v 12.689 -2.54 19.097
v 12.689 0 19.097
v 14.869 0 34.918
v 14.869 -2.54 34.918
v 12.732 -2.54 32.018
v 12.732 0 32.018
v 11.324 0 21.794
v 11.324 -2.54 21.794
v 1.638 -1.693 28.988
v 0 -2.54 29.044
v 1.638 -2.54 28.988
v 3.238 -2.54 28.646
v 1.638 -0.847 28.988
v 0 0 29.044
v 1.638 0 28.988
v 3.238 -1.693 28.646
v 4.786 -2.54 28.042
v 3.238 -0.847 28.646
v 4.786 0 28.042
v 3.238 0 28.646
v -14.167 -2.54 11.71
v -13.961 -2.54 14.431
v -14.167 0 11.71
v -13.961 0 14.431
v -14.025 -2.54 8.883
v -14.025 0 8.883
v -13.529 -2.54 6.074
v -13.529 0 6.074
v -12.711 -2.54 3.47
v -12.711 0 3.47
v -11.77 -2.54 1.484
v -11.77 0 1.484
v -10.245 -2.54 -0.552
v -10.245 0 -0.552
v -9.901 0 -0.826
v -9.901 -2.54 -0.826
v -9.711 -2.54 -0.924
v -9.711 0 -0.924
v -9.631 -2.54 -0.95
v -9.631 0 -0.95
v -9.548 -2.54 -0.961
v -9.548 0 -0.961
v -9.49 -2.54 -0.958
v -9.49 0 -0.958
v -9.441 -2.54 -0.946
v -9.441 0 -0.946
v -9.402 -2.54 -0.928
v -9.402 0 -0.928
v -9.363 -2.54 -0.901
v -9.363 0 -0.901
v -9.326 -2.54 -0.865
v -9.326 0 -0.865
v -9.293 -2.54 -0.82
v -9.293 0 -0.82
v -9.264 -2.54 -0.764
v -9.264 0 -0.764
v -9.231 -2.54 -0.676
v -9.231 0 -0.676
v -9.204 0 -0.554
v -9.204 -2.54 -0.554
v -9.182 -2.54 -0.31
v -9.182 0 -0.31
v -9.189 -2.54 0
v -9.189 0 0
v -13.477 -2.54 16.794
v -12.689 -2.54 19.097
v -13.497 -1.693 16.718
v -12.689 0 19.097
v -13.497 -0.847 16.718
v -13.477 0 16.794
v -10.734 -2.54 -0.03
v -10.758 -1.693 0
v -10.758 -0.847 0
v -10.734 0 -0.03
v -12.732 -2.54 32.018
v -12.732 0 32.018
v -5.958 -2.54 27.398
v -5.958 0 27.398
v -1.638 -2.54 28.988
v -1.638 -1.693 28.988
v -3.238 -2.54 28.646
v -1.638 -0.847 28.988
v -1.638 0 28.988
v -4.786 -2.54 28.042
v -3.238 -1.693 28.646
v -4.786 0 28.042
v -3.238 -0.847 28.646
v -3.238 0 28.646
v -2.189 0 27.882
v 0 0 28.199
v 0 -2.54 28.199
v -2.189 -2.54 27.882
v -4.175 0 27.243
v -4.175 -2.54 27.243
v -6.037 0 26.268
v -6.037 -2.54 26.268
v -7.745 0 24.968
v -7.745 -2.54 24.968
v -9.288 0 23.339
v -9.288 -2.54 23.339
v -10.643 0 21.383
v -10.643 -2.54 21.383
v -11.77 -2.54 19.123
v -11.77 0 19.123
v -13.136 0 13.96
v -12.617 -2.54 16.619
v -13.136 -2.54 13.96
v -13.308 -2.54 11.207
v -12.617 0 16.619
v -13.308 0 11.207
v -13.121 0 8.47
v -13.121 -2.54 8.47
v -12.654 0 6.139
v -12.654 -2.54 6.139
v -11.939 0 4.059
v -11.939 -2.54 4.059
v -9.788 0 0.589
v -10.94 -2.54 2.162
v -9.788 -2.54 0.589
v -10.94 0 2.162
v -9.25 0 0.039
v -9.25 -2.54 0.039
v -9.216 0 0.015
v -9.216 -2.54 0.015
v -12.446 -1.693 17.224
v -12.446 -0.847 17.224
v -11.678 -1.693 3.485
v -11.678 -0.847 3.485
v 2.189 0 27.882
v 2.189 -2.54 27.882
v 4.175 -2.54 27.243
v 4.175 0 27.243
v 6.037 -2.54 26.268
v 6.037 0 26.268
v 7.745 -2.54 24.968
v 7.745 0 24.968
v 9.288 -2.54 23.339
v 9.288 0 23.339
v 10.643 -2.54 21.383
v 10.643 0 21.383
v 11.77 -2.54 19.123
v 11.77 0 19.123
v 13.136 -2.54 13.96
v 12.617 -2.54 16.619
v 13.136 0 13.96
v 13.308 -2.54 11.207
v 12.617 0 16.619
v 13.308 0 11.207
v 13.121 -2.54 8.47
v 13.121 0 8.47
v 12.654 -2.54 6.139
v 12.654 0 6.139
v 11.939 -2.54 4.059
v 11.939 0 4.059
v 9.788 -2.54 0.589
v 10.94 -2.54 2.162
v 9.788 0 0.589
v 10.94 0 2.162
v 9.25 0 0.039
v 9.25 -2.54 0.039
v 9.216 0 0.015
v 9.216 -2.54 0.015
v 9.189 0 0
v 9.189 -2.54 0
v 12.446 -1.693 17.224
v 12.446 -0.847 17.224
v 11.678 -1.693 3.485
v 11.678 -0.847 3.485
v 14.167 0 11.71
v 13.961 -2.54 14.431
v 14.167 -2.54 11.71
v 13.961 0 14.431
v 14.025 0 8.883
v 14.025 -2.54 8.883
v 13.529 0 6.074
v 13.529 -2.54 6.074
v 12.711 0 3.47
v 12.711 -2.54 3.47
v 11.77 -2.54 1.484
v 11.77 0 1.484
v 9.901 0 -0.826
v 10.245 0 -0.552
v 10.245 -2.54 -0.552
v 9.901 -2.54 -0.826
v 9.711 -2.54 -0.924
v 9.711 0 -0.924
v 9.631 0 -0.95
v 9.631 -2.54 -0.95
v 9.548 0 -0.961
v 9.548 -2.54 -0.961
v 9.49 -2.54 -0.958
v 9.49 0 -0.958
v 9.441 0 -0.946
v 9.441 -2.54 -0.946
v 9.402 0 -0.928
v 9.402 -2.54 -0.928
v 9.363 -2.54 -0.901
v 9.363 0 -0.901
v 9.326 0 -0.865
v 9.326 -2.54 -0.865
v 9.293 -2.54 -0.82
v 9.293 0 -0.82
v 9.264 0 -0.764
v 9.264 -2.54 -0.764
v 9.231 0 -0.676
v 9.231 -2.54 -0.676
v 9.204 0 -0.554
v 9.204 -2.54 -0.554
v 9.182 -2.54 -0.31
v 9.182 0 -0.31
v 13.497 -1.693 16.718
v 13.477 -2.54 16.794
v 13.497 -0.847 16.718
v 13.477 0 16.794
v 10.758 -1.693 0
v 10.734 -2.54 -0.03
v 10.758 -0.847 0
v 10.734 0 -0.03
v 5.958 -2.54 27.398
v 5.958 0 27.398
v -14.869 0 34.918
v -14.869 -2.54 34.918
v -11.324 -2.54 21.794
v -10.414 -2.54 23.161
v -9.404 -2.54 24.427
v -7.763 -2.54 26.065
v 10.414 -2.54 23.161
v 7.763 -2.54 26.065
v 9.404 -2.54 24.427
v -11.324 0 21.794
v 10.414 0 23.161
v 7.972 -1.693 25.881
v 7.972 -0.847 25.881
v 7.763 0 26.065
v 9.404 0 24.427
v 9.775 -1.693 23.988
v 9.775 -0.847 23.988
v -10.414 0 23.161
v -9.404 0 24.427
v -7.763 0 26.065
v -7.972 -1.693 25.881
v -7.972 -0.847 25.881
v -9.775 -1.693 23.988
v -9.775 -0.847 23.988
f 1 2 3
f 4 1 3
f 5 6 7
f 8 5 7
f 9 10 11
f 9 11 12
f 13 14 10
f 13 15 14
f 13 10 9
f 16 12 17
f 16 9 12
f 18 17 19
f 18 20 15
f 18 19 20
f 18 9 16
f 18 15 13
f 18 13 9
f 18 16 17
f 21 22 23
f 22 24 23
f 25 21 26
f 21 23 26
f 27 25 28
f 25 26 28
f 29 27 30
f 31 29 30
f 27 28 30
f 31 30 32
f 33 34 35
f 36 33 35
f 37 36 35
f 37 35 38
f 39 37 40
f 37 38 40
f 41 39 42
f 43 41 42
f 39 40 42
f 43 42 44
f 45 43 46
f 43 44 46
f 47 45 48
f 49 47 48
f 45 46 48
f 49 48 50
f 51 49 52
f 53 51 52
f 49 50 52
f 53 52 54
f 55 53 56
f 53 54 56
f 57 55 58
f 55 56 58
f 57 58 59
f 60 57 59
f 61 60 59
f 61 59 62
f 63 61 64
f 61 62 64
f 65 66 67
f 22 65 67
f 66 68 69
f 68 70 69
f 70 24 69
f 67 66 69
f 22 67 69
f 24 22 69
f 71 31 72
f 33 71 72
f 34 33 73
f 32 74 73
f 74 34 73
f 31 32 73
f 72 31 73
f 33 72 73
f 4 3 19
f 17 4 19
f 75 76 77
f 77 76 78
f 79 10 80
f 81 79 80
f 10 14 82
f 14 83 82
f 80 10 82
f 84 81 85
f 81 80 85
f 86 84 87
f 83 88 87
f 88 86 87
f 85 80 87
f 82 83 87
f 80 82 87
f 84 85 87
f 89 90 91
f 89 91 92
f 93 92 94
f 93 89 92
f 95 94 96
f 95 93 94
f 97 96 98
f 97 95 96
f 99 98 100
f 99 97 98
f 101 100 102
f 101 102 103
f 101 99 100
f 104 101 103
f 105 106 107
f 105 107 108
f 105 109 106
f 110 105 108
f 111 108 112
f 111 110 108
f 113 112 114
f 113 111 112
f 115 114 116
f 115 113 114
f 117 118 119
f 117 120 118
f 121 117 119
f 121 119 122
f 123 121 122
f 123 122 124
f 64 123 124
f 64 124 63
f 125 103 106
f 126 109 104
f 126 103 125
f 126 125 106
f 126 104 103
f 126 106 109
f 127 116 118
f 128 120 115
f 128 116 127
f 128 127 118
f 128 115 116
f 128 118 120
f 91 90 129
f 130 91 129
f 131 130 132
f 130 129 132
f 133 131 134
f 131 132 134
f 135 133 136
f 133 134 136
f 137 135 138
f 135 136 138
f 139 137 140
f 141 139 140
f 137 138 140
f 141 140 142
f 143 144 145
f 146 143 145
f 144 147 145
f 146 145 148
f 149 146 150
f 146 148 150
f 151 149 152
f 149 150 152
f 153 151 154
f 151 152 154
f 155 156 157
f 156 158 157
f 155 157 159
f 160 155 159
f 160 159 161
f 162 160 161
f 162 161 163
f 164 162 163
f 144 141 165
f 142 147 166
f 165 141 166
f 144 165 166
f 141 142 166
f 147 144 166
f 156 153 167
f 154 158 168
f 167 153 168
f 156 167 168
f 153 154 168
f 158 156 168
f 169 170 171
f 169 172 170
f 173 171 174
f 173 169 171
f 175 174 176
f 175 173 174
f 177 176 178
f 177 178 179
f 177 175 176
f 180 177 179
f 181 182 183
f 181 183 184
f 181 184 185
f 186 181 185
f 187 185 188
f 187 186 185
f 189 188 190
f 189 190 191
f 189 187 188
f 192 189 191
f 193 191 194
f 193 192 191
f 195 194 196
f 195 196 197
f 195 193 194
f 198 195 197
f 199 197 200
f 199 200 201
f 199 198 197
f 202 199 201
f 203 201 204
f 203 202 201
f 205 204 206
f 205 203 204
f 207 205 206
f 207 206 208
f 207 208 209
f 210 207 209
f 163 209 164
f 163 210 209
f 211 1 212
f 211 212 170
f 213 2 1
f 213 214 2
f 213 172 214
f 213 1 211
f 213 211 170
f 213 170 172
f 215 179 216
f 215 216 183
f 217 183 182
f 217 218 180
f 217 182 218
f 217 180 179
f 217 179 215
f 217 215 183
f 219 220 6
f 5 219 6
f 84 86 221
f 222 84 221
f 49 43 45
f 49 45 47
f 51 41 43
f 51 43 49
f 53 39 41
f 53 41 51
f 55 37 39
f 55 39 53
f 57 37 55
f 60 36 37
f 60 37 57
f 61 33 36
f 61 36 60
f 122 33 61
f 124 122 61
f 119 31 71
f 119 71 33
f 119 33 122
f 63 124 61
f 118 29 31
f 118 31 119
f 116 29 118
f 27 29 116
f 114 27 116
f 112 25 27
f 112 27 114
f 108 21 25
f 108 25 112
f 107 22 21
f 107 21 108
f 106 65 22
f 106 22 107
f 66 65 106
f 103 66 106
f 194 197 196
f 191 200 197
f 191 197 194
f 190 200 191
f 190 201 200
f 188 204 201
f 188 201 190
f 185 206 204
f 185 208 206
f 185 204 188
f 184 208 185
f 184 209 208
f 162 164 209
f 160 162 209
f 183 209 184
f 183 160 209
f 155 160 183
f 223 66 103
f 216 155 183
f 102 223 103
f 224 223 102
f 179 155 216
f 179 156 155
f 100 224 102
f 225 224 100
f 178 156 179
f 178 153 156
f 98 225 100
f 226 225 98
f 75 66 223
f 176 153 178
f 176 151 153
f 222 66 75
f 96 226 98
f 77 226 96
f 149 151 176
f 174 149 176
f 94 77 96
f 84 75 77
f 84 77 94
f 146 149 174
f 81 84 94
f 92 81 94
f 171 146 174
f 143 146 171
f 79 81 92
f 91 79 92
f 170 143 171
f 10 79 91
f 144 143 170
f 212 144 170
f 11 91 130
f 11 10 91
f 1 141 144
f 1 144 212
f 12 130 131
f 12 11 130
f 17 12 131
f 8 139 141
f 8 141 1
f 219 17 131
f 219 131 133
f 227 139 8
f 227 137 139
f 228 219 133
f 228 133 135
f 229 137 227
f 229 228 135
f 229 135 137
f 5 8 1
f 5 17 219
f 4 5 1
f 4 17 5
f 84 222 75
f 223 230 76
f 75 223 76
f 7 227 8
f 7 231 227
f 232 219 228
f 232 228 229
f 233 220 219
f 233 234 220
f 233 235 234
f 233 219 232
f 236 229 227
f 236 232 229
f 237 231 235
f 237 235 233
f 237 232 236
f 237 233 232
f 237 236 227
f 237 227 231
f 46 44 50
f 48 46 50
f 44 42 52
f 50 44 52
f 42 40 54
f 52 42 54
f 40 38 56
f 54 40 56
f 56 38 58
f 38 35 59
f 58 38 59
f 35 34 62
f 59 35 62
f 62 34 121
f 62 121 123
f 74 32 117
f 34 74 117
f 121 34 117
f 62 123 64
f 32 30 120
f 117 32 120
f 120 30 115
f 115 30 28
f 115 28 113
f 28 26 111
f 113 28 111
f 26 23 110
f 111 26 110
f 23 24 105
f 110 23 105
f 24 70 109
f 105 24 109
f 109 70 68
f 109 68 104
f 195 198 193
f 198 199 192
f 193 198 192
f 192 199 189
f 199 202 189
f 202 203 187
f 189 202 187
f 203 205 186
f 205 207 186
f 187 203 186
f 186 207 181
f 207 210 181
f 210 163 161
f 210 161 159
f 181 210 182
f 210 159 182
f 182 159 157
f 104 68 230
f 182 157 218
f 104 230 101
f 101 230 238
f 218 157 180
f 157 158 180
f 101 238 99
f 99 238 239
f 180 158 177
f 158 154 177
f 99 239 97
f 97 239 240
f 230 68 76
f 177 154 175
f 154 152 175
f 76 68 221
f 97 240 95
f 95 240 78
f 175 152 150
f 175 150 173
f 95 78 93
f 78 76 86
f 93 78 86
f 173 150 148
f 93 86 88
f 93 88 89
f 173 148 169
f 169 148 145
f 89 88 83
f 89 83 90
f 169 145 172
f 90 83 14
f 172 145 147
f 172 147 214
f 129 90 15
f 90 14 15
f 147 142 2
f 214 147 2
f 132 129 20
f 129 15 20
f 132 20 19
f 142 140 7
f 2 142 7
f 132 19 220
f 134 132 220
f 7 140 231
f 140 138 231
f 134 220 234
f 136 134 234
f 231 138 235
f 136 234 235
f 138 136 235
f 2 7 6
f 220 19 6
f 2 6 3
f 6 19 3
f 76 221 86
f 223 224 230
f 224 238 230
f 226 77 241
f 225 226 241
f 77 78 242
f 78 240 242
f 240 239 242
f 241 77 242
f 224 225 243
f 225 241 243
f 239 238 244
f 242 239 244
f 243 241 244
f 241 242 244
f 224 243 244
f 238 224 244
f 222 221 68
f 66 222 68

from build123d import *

# Parameters (mm, degrees)
F1_DEPTH = 2.54


with BuildPart() as f1:
    # F0 (on Front) → F1 (new body)
    with BuildSketch(Plane.XZ):
        with BuildLine():
            Line((14.8689377659, 34.9178511836), (4.7862156734, 28.0418161935))
            add(Edge.make_bspline(
                [(4.7862156734, 28.0418161935), (5.1842631853, 27.8511368087), (5.5753581281, 27.6360125047), (5.9582704652, 27.3984828182)],
                knots=[0.1204484957, 0.1204484957, 0.1204484957, 0.1204484957, 0.1520508561, 0.1520508561, 0.1520508561, 0.1520508561], degree=3))
            Line((5.9582704652, 27.3984828182), (12.732363106, 32.0181577032))
            Line((12.732363106, 32.0181577032), (11.3236512241, 21.7942845656))
            add(Edge.make_bspline(
                [(11.3236512241, 21.7942845656), (11.8440132645, 20.9359181108), (12.302606577, 20.0312328496), (12.6890896057, 19.0973762258)],
                knots=[0.3256392374, 0.3256392374, 0.3256392374, 0.3256392374, 0.3898994489, 0.3898994489, 0.3898994489, 0.3898994489], degree=3))
            Line((12.6890896057, 19.0973762258), (14.8689377659, 34.9178511836))
        make_face()
        with BuildLine():
            add(Edge.make_bspline(
                [(-4.7862156734, 28.0418161935), (-5.1842631853, 27.8511368087), (-5.5753581281, 27.6360125047), (-5.9582704652, 27.3984828182)],
                knots=[0.1204484957, 0.1204484957, 0.1204484957, 0.1204484957, 0.1520508561, 0.1520508561, 0.1520508561, 0.1520508561], degree=3))
            Line((-4.7862156734, 28.0418161935), (-14.8689377659, 34.9178511836))
            Line((-14.8689377659, 34.9178511836), (-12.6890896057, 19.0973762258))
            add(Edge.make_bspline(
                [(-11.3236512241, 21.7942845656), (-11.8440132645, 20.9359181108), (-12.302606577, 20.0312328496), (-12.6890896057, 19.0973762258)],
                knots=[0.3256392374, 0.3256392374, 0.3256392374, 0.3256392374, 0.3898994489, 0.3898994489, 0.3898994489, 0.3898994489], degree=3))
            Line((-11.3236512241, 21.7942845656), (-12.732363106, 32.0181577032))
            Line((-12.732363106, 32.0181577032), (-5.9582704652, 27.3984828182))
        make_face()
        with BuildLine():
            add(Edge.make_bspline(
                [(0, 29.043843347), (1.6510006337, 29.1402167196), (3.2691067187, 28.7685671305), (4.7862156734, 28.0418161935)],
                knots=[0, 0, 0, 0, 0.1204484957, 0.1204484957, 0.1204484957, 0.1204484957], degree=3))
            add(Edge.make_bspline(
                [(0, 29.043843347), (-1.6510006337, 29.1402167196), (-3.2691067187, 28.7685671305), (-4.7862156734, 28.0418161935)],
                knots=[0, 0, 0, 0, 0.1204484957, 0.1204484957, 0.1204484957, 0.1204484957], degree=3))
            add(Edge.make_bspline(
                [(-4.7862156734, 28.0418161935), (-5.1842631853, 27.8511368087), (-5.5753581281, 27.6360125047), (-5.9582704652, 27.3984828182)],
                knots=[0.1204484957, 0.1204484957, 0.1204484957, 0.1204484957, 0.1520508561, 0.1520508561, 0.1520508561, 0.1520508561], degree=3))
            add(Edge.make_bspline(
                [(-5.9582704652, 27.3984828182), (-8.0615669228, 26.0937576898), (-9.9179788464, 24.1130202187), (-11.3236512241, 21.7942845656)],
                knots=[0.1520508561, 0.1520508561, 0.1520508561, 0.1520508561, 0.3256392374, 0.3256392374, 0.3256392374, 0.3256392374], degree=3))
            add(Edge.make_bspline(
                [(-11.3236512241, 21.7942845656), (-11.8440132645, 20.9359181108), (-12.302606577, 20.0312328496), (-12.6890896057, 19.0973762258)],
                knots=[0.3256392374, 0.3256392374, 0.3256392374, 0.3256392374, 0.3898994489, 0.3898994489, 0.3898994489, 0.3898994489], degree=3))
            add(Edge.make_bspline(
                [(-12.6890896057, 19.0973762258), (-13.0103649171, 18.3210806182), (-15.4505220691, 11.1613604921), (-12.8247367975, 1.0065517387), (-9.0871575297, -1.5643117344), (-9.1890276516, 0)],
                knots=[0.3898994489, 0.3898994489, 0.3898994489, 0.3898994489, 0.4433176275, 0.8701021062, 1, 1, 1, 1], degree=3))
            add(Edge.make_bspline(
                [(0, 28.1988892792), (-6.7379450358, 27.7811610109), (-14.5293932549, 18.0290497191), (-13.0806609004, 4.071660879), (-9.4108605954, 0.1006722728), (-9.1890276516, 0)],
                knots=[0, 0, 0, 0, 0.4049172426, 0.7736450245, 0.9793497587, 0.9793497587, 0.9793497587, 0.9793497587], degree=3))
            add(Edge.make_bspline(
                [(0, 28.1988892792), (6.7379450358, 27.7811610109), (14.5293932549, 18.0290497191), (13.0806609004, 4.071660879), (9.4108605954, 0.1006722728), (9.1890276516, 0)],
                knots=[0, 0, 0, 0, 0.4049172426, 0.7736450245, 0.9793497587, 0.9793497587, 0.9793497587, 0.9793497587], degree=3))
            add(Edge.make_bspline(
                [(12.6890896057, 19.0973762258), (13.0103649171, 18.3210806182), (15.4505220691, 11.1613604921), (12.8247367975, 1.0065517387), (9.0871575297, -1.5643117344), (9.1890276516, 0)],
                knots=[0.3898994489, 0.3898994489, 0.3898994489, 0.3898994489, 0.4433176275, 0.8701021062, 1, 1, 1, 1], degree=3))
            add(Edge.make_bspline(
                [(11.3236512241, 21.7942845656), (11.8440132645, 20.9359181108), (12.302606577, 20.0312328496), (12.6890896057, 19.0973762258)],
                knots=[0.3256392374, 0.3256392374, 0.3256392374, 0.3256392374, 0.3898994489, 0.3898994489, 0.3898994489, 0.3898994489], degree=3))
            add(Edge.make_bspline(
                [(5.9582704652, 27.3984828182), (8.0615669228, 26.0937576898), (9.9179788464, 24.1130202187), (11.3236512241, 21.7942845656)],
                knots=[0.1520508561, 0.1520508561, 0.1520508561, 0.1520508561, 0.3256392374, 0.3256392374, 0.3256392374, 0.3256392374], degree=3))
            add(Edge.make_bspline(
                [(4.7862156734, 28.0418161935), (5.1842631853, 27.8511368087), (5.5753581281, 27.6360125047), (5.9582704652, 27.3984828182)],
                knots=[0.1204484957, 0.1204484957, 0.1204484957, 0.1204484957, 0.1520508561, 0.1520508561, 0.1520508561, 0.1520508561], degree=3))
        make_face()
    extrude(amount=F1_DEPTH)


solid = f1.part
